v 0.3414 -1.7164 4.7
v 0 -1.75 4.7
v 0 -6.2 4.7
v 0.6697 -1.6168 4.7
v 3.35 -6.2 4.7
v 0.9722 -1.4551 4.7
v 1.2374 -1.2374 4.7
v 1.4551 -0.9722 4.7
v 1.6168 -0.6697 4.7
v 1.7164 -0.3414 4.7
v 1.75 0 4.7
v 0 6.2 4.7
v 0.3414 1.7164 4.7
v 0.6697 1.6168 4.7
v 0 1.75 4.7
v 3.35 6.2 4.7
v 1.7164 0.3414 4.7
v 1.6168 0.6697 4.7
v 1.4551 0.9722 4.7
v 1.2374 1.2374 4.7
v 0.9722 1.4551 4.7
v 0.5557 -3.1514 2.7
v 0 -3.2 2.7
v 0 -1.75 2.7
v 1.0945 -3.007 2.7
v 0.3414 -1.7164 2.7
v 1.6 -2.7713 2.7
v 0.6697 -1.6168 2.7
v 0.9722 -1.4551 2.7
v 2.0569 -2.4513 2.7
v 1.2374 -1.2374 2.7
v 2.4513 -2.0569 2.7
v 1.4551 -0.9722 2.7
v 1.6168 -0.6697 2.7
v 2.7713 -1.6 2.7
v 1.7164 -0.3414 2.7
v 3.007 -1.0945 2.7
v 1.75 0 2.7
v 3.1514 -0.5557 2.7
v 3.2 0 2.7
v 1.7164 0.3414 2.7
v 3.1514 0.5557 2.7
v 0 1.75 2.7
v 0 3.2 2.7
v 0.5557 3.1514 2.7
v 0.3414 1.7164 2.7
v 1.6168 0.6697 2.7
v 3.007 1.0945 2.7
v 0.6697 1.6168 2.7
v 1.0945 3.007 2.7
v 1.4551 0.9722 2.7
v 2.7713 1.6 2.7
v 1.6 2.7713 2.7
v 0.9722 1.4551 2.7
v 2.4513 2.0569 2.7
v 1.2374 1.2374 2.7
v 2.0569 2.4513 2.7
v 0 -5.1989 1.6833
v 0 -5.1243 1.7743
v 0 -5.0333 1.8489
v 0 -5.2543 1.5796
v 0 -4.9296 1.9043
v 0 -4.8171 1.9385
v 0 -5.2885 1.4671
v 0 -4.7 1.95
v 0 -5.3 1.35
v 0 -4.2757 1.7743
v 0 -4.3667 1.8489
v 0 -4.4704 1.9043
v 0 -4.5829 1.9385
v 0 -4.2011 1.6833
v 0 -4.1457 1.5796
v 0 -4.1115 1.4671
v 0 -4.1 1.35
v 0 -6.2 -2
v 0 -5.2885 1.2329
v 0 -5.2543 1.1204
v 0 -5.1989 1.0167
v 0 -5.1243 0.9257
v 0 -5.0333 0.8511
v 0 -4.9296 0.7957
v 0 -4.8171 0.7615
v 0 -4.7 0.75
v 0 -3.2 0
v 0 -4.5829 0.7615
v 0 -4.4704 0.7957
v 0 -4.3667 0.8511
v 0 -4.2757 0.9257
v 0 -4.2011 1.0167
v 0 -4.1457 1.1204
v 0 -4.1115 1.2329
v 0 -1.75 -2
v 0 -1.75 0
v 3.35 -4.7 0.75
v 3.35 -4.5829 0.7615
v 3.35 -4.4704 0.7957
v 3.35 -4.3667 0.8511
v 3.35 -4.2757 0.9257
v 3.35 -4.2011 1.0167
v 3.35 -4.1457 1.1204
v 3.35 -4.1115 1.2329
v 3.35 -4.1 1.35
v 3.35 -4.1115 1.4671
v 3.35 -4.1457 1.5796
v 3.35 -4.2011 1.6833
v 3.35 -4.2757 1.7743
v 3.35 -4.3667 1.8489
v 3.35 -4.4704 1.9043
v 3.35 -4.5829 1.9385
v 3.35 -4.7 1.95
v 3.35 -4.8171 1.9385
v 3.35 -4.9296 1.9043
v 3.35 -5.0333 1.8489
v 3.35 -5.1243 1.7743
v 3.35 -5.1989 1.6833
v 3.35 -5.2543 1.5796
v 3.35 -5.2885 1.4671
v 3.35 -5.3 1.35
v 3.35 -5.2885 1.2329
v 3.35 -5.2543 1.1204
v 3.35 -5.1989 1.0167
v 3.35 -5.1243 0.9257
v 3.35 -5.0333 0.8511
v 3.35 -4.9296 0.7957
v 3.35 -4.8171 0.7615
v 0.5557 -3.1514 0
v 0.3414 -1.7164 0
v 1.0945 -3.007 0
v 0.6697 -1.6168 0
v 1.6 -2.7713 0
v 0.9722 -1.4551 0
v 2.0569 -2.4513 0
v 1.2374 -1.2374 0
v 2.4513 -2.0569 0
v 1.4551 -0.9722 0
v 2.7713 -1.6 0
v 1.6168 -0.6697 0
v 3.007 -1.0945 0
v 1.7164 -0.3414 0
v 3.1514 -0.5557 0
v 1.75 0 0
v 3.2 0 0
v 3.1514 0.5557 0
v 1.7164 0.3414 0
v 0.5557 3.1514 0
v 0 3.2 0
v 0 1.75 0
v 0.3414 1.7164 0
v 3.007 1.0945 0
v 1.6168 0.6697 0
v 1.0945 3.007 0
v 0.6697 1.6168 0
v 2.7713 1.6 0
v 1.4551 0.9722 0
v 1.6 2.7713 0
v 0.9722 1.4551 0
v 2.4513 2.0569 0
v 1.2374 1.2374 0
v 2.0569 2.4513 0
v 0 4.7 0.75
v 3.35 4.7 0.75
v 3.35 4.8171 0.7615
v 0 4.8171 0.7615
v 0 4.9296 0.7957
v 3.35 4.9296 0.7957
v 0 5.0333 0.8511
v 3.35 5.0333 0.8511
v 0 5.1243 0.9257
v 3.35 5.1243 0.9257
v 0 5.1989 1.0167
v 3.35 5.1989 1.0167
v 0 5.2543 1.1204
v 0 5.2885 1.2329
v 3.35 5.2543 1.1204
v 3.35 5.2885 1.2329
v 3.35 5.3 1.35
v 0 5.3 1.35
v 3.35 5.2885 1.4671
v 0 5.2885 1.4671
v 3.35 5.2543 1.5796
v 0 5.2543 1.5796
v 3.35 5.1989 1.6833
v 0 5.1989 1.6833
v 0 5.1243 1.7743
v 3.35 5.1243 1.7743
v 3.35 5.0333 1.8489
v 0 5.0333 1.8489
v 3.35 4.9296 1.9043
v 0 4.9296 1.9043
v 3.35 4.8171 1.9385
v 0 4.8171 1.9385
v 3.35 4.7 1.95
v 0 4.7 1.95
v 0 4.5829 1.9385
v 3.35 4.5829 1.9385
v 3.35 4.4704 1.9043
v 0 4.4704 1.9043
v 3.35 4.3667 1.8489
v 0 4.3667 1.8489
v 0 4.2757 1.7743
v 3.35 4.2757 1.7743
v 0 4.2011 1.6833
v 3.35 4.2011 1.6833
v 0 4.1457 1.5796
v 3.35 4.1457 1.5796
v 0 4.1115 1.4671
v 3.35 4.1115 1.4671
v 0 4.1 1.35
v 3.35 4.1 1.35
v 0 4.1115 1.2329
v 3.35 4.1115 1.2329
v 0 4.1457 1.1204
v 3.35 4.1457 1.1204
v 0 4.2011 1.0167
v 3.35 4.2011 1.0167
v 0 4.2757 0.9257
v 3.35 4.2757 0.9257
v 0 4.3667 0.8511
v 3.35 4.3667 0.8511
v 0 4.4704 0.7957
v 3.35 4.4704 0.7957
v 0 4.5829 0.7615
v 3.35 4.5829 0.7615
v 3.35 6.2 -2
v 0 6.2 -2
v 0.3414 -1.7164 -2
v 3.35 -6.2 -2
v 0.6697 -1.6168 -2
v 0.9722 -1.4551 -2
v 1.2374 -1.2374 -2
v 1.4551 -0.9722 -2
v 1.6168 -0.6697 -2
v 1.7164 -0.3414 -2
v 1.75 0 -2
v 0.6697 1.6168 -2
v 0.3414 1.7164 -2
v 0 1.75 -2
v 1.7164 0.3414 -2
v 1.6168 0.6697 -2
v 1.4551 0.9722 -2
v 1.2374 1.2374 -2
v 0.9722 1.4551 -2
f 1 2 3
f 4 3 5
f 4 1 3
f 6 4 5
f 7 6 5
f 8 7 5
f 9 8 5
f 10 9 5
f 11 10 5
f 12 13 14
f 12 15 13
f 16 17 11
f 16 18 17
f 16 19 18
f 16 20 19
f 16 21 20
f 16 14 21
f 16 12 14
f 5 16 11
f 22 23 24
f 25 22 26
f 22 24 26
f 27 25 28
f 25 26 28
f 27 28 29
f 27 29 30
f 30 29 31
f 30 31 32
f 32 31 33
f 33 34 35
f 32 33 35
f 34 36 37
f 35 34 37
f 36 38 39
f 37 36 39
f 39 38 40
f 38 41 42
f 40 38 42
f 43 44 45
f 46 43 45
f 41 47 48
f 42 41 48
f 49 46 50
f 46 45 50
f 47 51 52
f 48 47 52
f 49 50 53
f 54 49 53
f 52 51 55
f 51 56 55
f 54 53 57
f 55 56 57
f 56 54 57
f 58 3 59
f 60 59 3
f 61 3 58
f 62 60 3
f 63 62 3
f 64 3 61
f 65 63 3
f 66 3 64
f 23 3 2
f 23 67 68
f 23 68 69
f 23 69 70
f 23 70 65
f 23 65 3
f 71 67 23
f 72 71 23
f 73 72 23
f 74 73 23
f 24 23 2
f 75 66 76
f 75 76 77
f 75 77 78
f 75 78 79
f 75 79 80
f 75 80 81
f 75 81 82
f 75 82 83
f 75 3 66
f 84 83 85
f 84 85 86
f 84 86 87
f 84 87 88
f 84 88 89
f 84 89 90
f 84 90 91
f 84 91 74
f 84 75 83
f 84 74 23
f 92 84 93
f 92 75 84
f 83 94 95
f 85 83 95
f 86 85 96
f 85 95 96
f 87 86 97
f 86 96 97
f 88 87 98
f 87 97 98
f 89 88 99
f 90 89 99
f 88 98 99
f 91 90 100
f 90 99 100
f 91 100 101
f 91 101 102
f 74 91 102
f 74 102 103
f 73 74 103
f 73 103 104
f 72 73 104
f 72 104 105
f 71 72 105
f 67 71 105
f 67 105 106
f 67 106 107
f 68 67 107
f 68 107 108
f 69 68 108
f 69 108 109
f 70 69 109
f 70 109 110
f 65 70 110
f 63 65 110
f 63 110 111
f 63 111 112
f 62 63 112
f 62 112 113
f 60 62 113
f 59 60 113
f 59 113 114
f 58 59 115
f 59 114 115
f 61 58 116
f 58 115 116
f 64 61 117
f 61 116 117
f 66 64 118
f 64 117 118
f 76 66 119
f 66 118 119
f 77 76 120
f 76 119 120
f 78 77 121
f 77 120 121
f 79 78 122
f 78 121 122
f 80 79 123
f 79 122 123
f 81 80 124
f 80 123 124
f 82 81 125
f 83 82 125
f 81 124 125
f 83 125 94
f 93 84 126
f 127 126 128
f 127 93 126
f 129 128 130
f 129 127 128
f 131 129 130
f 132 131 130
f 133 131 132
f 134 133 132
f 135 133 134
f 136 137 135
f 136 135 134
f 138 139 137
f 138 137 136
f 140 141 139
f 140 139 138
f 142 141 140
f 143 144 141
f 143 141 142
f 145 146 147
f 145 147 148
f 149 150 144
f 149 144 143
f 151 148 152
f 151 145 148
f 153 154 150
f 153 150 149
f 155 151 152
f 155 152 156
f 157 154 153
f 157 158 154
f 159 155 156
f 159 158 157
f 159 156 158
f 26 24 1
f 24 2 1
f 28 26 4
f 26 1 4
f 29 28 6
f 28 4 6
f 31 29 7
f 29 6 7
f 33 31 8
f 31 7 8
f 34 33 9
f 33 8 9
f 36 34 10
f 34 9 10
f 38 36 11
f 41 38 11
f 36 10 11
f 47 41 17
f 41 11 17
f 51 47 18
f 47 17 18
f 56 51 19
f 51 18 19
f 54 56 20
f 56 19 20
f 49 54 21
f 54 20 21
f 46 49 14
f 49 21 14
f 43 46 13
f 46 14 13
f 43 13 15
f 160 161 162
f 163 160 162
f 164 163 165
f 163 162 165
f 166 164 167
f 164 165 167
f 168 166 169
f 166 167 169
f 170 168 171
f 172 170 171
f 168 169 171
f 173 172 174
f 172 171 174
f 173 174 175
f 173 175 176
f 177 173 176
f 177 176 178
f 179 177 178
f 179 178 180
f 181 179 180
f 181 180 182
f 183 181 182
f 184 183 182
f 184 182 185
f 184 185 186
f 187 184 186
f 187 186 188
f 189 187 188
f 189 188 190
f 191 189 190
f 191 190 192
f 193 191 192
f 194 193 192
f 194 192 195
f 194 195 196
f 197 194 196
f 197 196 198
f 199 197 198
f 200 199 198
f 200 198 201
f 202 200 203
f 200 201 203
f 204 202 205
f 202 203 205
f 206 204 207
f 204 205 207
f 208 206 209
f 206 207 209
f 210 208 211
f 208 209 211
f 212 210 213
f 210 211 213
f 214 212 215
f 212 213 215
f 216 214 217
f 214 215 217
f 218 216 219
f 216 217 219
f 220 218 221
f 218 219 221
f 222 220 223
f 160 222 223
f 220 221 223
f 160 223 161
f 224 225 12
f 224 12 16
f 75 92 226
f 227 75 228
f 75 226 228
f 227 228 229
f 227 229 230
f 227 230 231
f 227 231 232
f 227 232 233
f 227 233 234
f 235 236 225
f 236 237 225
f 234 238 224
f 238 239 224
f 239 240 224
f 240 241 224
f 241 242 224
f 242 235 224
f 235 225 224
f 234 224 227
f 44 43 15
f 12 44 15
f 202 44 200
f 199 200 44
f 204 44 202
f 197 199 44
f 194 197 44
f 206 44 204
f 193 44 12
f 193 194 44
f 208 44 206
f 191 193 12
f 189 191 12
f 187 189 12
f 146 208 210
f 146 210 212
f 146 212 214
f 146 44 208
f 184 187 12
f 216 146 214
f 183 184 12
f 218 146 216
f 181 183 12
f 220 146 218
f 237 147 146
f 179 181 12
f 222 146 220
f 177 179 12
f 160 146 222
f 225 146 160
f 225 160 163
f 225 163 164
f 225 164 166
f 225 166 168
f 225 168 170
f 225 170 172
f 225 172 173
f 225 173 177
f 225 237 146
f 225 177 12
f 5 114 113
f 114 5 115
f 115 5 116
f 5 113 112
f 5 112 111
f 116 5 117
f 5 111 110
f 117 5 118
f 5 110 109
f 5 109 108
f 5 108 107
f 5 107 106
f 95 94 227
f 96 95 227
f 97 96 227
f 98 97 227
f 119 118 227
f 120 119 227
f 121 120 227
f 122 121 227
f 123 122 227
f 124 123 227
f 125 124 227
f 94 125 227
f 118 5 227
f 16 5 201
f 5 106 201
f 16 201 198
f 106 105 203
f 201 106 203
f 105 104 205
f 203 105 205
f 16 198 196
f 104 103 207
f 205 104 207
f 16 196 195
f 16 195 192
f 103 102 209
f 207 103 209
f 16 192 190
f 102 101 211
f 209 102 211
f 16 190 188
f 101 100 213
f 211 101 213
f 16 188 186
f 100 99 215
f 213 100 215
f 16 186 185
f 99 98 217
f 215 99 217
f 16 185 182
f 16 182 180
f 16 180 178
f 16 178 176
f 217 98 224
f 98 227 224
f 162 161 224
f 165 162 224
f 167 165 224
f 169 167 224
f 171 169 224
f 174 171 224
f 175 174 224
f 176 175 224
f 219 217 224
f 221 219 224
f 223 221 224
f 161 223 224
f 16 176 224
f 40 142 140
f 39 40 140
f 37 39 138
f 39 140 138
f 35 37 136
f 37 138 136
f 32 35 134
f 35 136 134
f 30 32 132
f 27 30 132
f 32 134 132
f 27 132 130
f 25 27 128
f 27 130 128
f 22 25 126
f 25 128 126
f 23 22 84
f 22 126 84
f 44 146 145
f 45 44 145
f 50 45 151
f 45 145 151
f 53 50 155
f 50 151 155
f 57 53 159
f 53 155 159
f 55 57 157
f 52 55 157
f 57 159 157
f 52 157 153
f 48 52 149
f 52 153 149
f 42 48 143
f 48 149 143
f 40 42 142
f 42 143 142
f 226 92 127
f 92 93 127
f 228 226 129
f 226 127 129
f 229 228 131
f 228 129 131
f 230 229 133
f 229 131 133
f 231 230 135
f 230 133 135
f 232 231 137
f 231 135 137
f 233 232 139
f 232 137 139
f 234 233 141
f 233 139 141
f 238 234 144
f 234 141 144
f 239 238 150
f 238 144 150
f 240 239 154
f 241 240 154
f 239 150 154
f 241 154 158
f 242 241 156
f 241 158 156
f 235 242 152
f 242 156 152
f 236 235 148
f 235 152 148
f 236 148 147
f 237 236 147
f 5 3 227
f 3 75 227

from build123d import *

# Parameters (mm, degrees)
EXTRUDE_1_DEPTH     = 2.7
SKETCH_1_4_W        = 3.35
SKETCH_1_4_H        = 12.4
EXTRUDE_2_DEPTH     = 2
EXTRUDE_START       = 2.7
SKETCH_1_5_W        = 3.35
SKETCH_1_5_H        = 12.4
EXTRUDE_3_DEPTH     = 2
SKETCH_2_R          = 1.75
CUT_EXTRUDE_1_DEPTH = 10.723810981
SKETCH_4_R          = 0.6
CUT_EXTRUDE_2_DEPTH = 9.470684742


with BuildPart() as part:
    # 草图1 → 凸台-拉伸1 (new body)
    with BuildSketch(Plane.XY):
        with BuildLine():
            Line((3.35, 6.2), (0, 6.2))
            Line((0, 6.2), (0, 3.2))
            ThreePointArc((0, 3.2), (2.2627417, 2.2627417), (3.2, 0))
            ThreePointArc((3.2, 0), (2.2627417, -2.2627417), (0, -3.2))
            Line((0, -3.2), (0, -6.2))
            Line((0, -6.2), (3.35, -6.2))
            Line((3.35, -6.2), (3.35, 6.2))
        make_face()
    extrude(amount=EXTRUDE_1_DEPTH)

    # 草图1<4> → 凸台-拉伸2 (add)
    with BuildSketch(Plane.XY):
        with Locations((1.675, 0)):
            Rectangle(SKETCH_1_4_W, SKETCH_1_4_H)
    extrude(amount=-EXTRUDE_2_DEPTH)

    # 草图1<5> → 凸台-拉伸3 (add)
    with BuildSketch(Plane.XY.offset(EXTRUDE_START)):
        with Locations((1.675, 0)):
            Rectangle(SKETCH_1_5_W, SKETCH_1_5_H)
    extrude(amount=EXTRUDE_3_DEPTH)

    # 草图2 → 切除-拉伸1 (cut, through all)
    with BuildSketch(Plane.XY.offset(4.7)):
        Circle(SKETCH_2_R)
    extrude(amount=-CUT_EXTRUDE_1_DEPTH, mode=Mode.SUBTRACT)

    # 草图4 → 切除-拉伸2 (cut, through all)
    with BuildSketch(Plane(origin=(3.35, 0, 0), x_dir=(0, 0, -1), z_dir=(1, 0, 0))):
        with Locations((-1.35, -4.7)):
            Circle(SKETCH_4_R)
        with Locations((-1.35, 4.7)):
            Circle(SKETCH_4_R)
    extrude(amount=-CUT_EXTRUDE_2_DEPTH, mode=Mode.SUBTRACT)


solid = part.part
